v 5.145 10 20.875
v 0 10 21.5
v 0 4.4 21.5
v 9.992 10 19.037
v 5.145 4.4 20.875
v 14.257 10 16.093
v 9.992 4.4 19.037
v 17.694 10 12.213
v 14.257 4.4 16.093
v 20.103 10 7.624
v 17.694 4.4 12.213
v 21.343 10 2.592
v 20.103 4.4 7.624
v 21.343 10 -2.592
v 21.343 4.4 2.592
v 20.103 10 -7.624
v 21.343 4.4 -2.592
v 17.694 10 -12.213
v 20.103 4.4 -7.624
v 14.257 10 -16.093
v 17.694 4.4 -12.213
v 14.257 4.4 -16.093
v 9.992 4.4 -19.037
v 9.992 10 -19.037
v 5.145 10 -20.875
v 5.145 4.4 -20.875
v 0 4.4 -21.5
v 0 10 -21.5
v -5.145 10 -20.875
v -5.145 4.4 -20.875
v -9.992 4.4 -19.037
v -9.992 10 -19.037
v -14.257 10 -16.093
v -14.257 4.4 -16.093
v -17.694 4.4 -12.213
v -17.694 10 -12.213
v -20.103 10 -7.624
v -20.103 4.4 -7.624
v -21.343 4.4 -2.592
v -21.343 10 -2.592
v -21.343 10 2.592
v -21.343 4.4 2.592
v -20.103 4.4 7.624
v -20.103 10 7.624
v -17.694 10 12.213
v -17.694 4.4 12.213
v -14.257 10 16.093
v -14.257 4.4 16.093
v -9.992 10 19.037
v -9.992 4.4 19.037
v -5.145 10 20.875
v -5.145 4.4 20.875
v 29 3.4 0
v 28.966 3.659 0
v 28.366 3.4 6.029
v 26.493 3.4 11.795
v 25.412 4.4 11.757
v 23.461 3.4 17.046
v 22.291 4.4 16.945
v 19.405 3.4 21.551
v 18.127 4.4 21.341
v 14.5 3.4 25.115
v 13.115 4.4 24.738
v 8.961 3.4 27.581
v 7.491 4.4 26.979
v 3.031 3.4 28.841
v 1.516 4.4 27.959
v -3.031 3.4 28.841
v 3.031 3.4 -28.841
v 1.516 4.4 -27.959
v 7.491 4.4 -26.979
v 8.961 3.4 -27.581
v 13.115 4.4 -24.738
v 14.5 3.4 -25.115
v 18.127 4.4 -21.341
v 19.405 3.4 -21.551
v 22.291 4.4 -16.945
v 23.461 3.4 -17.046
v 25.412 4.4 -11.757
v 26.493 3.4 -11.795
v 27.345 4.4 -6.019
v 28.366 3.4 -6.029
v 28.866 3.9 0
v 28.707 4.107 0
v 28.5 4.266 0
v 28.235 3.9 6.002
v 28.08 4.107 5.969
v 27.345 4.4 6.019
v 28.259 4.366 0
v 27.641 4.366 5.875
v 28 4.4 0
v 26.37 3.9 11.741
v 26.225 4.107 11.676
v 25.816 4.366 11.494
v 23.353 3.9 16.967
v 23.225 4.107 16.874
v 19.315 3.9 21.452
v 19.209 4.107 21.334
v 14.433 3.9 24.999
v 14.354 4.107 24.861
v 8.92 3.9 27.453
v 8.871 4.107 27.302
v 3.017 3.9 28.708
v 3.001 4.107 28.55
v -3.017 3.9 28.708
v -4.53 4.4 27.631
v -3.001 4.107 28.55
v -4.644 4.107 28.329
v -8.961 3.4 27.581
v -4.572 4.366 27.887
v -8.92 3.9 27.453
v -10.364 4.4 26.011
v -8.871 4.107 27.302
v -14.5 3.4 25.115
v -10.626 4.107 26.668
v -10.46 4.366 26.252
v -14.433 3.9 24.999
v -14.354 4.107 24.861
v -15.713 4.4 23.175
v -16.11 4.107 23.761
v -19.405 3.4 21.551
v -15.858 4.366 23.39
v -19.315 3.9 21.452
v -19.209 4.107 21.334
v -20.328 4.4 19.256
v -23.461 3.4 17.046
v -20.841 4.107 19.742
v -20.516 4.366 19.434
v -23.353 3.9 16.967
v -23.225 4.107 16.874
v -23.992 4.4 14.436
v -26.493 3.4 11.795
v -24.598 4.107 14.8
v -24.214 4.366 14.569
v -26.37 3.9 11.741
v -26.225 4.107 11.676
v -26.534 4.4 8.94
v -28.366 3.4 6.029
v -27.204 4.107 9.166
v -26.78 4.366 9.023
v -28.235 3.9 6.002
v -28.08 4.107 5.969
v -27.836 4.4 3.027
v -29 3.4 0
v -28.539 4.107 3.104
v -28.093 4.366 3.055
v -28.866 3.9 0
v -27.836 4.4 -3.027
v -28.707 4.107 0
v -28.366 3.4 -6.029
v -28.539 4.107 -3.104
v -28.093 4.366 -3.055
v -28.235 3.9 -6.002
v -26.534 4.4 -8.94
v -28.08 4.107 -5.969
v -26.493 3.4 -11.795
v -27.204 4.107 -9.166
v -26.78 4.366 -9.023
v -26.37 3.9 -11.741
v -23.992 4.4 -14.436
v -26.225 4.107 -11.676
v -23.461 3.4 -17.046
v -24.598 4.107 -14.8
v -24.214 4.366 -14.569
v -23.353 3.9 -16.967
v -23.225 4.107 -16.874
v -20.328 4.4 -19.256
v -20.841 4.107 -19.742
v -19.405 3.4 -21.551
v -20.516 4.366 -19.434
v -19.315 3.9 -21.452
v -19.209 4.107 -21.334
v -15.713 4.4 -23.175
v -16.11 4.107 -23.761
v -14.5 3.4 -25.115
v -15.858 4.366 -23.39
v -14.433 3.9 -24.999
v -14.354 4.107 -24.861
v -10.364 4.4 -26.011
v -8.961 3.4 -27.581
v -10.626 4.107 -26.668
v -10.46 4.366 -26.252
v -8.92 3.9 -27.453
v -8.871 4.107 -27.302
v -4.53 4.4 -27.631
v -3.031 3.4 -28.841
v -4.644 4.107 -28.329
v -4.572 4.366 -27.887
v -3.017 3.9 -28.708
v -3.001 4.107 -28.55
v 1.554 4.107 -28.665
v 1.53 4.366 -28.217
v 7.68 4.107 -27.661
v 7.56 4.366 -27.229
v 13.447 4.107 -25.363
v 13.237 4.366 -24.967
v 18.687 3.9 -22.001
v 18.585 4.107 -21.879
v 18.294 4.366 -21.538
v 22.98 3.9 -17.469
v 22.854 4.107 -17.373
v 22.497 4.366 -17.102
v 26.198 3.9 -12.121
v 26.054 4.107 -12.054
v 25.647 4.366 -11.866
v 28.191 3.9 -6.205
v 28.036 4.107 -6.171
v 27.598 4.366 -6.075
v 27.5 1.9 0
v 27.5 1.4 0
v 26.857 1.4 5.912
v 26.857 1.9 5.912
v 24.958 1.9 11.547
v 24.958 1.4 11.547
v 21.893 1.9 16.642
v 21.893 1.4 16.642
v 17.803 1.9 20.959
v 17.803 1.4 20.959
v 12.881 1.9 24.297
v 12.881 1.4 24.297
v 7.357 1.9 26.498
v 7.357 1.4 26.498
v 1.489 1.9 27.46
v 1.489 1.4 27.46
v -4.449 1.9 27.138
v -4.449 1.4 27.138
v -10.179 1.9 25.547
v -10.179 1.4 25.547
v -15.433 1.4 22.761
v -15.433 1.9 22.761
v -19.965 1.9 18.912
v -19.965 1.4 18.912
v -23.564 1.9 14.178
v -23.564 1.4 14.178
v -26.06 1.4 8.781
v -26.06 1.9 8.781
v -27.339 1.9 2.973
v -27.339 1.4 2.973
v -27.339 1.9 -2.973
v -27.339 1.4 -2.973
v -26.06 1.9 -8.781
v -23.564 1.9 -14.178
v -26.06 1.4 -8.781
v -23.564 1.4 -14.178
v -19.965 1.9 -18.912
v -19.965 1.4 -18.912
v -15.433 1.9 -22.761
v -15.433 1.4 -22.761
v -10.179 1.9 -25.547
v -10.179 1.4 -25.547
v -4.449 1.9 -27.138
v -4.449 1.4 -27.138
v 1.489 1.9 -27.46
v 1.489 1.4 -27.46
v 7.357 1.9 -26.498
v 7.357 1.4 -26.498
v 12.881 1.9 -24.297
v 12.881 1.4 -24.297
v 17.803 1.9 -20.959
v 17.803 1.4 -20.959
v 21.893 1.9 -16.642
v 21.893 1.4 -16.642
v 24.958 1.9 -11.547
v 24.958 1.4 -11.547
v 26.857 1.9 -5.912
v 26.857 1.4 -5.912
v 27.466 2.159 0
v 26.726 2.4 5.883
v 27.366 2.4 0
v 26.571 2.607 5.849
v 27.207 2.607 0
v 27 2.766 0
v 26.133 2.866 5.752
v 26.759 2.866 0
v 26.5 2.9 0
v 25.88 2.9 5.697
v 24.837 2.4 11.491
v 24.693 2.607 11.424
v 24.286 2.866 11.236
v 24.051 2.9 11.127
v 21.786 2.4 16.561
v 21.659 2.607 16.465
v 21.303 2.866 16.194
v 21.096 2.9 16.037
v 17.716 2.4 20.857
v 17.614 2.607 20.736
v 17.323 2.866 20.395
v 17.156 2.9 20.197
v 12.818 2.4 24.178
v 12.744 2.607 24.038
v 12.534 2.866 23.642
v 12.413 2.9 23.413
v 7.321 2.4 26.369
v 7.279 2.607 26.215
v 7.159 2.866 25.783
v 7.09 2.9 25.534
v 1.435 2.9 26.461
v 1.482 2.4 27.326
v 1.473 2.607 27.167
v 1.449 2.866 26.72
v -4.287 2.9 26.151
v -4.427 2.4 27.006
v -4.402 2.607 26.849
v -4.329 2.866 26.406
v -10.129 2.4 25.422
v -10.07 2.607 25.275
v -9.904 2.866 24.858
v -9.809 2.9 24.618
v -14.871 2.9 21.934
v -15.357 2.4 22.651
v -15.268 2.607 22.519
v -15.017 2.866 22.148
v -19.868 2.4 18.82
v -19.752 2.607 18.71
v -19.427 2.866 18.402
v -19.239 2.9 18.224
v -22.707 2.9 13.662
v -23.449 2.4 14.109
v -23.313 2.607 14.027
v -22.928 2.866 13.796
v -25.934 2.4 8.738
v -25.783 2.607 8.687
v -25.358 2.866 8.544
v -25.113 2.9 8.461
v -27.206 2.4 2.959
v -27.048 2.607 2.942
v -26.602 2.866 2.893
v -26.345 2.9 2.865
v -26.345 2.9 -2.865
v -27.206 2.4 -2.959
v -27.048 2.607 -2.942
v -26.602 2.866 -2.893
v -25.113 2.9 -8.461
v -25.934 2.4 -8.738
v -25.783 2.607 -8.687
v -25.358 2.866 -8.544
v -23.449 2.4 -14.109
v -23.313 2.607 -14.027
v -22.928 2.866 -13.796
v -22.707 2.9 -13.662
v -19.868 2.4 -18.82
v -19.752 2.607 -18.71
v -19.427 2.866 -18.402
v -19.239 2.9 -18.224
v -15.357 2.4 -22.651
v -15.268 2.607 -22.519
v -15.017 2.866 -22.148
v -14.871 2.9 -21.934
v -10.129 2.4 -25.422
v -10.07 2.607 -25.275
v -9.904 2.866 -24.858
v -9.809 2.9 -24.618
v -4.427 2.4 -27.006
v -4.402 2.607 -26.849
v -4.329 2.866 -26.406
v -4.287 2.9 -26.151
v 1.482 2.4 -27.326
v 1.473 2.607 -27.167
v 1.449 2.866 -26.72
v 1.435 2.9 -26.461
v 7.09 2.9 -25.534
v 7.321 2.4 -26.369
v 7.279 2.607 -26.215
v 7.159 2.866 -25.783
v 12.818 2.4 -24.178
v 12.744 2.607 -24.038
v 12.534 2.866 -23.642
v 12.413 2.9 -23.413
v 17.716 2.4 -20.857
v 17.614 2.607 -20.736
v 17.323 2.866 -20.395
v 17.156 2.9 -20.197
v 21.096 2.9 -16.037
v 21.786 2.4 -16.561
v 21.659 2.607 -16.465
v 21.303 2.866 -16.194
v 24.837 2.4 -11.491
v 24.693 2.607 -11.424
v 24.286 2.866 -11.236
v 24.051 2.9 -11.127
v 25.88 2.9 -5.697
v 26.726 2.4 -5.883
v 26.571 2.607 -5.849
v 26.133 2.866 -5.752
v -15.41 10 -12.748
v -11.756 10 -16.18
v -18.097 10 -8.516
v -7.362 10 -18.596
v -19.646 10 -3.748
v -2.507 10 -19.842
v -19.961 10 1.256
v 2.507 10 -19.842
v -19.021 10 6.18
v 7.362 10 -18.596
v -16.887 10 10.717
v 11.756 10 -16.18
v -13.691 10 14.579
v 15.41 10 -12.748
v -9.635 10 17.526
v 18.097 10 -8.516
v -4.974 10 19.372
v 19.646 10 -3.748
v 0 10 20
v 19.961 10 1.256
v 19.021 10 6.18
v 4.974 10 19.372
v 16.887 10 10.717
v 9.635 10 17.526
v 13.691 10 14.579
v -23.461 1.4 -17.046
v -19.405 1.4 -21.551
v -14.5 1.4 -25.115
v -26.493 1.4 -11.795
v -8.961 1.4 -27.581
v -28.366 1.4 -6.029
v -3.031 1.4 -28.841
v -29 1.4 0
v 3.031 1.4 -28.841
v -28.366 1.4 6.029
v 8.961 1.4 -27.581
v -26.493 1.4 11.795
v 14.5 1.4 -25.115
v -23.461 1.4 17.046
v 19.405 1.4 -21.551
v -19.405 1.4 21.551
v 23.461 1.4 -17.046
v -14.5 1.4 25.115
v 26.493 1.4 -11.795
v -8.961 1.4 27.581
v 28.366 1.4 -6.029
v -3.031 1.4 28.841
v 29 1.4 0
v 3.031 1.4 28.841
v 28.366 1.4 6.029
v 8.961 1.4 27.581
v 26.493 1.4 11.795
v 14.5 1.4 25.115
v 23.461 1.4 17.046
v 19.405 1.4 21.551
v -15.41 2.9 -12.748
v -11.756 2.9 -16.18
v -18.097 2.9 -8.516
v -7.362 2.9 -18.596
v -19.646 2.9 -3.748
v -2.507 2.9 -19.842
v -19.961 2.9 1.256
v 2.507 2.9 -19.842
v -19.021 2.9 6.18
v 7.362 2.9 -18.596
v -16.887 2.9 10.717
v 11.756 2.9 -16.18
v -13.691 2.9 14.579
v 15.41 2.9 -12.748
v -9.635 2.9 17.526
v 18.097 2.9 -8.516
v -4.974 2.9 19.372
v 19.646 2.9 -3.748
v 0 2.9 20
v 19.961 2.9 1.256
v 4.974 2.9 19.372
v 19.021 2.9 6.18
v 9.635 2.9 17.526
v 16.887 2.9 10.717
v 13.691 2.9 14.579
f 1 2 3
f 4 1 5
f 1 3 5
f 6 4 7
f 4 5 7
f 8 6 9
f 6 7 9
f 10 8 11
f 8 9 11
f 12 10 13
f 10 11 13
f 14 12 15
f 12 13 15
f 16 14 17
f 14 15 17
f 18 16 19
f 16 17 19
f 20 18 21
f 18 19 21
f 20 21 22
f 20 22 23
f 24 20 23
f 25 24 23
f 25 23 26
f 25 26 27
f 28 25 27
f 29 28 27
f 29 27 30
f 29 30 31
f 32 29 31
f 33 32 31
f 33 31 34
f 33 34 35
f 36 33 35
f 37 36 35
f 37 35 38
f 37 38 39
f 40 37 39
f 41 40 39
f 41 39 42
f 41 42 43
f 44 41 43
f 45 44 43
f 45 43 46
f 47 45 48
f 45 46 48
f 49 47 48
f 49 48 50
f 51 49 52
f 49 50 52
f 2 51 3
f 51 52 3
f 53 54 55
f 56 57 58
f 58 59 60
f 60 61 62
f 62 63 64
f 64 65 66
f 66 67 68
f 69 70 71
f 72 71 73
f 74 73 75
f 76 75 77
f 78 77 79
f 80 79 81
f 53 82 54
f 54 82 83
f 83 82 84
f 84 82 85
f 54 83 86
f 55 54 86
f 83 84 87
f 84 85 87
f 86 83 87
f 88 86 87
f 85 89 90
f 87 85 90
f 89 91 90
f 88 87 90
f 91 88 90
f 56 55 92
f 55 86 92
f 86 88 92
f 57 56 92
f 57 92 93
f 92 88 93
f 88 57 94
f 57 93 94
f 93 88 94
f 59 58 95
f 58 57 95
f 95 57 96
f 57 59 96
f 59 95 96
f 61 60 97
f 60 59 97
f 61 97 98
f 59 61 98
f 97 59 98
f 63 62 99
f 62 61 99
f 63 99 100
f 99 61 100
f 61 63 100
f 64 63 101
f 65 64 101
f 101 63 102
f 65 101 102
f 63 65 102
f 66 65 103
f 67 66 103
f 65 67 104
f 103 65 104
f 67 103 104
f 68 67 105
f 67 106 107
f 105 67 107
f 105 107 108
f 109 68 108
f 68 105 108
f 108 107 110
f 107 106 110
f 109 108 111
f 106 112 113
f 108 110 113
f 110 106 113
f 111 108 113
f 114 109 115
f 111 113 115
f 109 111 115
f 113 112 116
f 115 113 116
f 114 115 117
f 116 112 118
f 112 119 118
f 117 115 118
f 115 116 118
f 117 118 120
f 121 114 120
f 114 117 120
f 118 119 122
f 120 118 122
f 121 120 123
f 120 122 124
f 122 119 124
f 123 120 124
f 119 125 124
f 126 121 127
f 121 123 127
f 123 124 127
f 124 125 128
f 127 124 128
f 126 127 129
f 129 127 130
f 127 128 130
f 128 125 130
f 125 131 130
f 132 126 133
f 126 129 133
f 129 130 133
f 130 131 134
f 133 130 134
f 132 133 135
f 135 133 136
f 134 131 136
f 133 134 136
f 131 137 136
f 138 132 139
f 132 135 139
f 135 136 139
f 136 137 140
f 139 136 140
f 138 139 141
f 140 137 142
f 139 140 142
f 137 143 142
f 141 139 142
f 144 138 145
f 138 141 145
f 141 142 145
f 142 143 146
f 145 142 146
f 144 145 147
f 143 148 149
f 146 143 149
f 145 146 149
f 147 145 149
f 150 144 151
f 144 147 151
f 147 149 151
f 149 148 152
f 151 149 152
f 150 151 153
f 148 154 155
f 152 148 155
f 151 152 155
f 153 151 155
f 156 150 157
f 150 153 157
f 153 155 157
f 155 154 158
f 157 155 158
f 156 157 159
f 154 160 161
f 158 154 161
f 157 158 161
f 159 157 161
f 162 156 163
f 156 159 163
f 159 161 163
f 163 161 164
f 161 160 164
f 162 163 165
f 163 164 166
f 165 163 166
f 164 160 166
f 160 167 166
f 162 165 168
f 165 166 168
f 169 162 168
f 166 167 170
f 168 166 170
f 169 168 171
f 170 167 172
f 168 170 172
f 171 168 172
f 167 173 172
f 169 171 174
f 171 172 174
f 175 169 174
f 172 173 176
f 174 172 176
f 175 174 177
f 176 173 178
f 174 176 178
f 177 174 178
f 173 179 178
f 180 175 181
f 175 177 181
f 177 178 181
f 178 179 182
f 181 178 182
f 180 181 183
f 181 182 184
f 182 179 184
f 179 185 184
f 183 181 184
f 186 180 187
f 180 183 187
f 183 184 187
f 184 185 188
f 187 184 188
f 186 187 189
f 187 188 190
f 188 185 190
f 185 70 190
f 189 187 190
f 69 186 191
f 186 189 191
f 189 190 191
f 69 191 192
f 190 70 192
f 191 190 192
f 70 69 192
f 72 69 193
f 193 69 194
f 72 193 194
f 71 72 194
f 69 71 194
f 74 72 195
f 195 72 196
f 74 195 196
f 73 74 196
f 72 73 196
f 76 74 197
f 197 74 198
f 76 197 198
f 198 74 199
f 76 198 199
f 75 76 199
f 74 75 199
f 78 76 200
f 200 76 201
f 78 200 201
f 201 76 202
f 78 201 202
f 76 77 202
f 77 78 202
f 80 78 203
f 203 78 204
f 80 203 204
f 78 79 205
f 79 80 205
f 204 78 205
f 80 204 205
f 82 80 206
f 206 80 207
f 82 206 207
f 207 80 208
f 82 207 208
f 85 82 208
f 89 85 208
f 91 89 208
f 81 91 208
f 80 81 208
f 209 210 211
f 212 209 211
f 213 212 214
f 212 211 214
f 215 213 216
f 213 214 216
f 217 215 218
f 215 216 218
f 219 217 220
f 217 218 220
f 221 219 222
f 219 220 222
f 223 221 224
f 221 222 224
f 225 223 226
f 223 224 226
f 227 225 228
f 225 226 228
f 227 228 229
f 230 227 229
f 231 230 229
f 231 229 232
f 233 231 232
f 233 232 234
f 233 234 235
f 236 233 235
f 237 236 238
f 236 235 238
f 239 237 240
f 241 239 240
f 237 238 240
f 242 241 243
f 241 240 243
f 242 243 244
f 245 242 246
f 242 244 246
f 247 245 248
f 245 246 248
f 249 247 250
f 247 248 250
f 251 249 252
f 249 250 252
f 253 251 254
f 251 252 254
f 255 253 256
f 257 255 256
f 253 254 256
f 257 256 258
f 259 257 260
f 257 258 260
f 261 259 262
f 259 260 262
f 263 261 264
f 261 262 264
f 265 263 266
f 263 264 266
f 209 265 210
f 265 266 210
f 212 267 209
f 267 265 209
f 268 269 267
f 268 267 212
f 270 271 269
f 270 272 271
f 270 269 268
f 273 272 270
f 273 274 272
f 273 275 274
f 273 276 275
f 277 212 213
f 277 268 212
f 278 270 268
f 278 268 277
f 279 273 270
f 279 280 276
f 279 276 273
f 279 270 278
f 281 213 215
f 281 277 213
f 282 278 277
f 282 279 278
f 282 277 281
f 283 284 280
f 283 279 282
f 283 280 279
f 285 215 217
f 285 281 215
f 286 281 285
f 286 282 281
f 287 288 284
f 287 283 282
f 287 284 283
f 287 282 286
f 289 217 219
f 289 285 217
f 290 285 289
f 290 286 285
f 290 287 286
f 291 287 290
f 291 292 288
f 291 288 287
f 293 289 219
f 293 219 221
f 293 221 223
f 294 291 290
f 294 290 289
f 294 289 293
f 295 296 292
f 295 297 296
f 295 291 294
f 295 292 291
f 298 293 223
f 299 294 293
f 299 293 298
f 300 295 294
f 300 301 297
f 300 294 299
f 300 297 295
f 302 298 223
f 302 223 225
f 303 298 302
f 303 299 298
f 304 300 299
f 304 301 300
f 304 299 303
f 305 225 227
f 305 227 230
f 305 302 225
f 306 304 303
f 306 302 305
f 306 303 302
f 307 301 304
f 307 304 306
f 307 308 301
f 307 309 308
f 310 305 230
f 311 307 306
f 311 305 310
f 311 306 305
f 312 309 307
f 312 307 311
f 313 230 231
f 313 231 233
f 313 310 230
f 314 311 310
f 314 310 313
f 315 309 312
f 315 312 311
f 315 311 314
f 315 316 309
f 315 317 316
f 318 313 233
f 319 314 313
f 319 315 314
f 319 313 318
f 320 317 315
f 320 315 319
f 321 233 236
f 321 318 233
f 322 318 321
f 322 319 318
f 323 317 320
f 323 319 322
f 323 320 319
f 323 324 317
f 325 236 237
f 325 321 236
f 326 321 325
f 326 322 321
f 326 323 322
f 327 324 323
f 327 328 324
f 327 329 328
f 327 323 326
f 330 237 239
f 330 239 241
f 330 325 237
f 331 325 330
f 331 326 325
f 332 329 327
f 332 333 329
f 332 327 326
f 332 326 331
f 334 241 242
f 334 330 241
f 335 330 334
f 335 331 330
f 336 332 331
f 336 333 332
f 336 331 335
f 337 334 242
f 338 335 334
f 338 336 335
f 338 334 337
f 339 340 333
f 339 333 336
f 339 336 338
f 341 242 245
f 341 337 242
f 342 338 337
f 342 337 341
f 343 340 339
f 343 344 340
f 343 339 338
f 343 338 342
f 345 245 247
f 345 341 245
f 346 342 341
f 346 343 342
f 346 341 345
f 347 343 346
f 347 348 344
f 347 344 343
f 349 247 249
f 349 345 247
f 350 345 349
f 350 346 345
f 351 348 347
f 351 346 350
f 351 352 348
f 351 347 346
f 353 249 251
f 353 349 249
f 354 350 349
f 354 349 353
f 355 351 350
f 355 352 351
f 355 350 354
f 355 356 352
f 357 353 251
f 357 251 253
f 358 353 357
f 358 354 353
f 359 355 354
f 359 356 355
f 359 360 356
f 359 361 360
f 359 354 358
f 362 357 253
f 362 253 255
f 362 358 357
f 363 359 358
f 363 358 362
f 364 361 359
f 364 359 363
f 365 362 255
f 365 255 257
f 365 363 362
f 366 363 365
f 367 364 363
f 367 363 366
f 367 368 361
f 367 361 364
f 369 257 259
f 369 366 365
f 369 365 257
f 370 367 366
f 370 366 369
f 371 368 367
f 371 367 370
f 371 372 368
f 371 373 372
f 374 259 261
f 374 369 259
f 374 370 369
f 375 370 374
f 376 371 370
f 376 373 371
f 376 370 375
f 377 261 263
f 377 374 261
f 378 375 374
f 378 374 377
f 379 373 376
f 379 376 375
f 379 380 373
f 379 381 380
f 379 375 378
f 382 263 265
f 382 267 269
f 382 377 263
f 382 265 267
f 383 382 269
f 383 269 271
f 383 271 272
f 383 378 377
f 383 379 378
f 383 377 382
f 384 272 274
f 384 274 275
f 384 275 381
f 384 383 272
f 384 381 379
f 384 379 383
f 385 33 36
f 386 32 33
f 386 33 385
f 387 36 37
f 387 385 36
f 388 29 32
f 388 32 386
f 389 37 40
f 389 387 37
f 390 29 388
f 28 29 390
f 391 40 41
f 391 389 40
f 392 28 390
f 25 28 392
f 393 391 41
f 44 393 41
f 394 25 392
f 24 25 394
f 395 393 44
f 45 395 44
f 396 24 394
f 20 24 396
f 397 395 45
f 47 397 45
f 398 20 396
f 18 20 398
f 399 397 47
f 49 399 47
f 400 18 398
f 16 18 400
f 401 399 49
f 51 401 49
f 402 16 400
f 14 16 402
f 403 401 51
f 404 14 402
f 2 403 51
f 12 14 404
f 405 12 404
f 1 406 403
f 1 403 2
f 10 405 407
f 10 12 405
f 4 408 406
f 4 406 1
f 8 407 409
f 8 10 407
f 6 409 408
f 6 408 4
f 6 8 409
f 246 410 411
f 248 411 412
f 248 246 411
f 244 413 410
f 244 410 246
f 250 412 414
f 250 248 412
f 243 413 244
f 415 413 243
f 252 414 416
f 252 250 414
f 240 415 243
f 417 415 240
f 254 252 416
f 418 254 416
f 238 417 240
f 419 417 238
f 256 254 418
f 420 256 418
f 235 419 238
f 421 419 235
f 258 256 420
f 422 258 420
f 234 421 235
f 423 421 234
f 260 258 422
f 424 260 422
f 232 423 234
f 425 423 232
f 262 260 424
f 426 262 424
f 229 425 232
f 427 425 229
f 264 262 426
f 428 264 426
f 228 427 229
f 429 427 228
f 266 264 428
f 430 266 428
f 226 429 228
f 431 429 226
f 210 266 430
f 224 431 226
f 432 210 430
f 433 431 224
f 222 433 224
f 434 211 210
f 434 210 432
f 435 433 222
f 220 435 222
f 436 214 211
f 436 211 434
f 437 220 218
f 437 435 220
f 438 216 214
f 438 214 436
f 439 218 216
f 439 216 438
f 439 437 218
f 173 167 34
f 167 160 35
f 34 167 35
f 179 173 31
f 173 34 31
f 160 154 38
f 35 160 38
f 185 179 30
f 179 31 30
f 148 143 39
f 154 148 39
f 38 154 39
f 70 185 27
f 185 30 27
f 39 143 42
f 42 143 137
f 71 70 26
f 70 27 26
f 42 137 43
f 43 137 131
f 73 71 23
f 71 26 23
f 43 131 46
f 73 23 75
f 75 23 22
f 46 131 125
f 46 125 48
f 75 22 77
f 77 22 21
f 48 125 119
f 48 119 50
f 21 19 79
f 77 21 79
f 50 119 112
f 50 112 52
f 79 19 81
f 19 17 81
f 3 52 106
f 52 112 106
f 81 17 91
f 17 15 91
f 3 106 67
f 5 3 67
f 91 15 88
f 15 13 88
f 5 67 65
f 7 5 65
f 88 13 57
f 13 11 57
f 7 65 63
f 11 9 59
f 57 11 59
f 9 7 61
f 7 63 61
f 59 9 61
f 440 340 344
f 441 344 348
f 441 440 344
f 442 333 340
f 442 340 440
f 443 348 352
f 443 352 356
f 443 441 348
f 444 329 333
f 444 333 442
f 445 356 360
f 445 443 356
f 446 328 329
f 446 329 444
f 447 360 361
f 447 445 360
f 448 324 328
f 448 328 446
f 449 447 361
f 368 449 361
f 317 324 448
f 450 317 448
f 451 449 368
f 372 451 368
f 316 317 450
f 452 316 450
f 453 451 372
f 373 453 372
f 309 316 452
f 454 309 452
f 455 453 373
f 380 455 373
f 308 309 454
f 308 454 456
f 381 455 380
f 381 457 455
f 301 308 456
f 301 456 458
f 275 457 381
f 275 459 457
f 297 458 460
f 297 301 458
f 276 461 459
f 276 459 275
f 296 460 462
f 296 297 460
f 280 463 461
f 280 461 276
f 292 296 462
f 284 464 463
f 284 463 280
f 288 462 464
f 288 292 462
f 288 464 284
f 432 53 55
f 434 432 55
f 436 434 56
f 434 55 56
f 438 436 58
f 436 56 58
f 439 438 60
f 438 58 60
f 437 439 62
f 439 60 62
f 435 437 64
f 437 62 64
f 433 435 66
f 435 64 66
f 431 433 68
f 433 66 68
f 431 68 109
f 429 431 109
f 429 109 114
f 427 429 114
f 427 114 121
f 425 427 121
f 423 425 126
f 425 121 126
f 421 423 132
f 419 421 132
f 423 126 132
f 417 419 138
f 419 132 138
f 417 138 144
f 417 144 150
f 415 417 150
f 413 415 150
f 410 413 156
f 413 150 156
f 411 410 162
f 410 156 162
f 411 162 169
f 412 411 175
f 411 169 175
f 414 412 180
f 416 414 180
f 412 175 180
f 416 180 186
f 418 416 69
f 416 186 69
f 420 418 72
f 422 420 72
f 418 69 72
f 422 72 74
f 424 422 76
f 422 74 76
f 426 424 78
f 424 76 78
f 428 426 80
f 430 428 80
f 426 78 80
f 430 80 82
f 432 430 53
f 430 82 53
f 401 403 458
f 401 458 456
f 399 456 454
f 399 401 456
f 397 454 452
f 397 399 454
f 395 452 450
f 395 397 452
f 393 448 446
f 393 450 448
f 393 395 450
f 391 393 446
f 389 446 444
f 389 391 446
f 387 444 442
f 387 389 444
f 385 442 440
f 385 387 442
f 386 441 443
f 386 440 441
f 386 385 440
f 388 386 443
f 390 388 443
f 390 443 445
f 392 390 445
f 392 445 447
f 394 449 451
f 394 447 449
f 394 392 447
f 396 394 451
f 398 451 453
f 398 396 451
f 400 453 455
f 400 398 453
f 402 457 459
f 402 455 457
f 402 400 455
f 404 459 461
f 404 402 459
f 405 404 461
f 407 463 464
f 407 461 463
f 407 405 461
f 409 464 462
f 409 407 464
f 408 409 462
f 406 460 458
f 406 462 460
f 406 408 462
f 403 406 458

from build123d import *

# Parameters (mm, degrees)
SKETCH1_R                = 21.5
SKETCH1_R_2              = 20
BOSS_EXTRUDE1_DEPTH      = 10
CUT_EXTRUDE1_DEPTH       = 24
CUT_EXTRUDE1_DEPTH_BACK  = 27
SKETCH3_W                = 51.96152563
SKETCH3_H                = 7.978608452
BOSS_EXTRUDE2_DEPTH      = 1.5
BOSS_EXTRUDE2_DEPTH_BACK = 1.5
SKETCH4_R                = 29
SKETCH4_R_2              = 20
SKETCH6_R                = 27.5
CUT_EXTRUDE2_DEPTH       = 1.5
FILLET1_R                = 1


with BuildPart() as part:
    # Sketch1 → Boss-Extrude1 (new body)
    with BuildSketch(Plane(origin=(0, 0, 0), x_dir=(1, 0, 0), z_dir=(0, 1, 0))):
        Circle(SKETCH1_R)
        Circle(SKETCH1_R_2, mode=Mode.SUBTRACT)
    extrude(amount=BOSS_EXTRUDE1_DEPTH)

    # Sketch3 → Cut-Extrude1 (cut, two sides: drawn at the far end of the back side and taken through both)
    with BuildSketch(Plane.XY.offset(-CUT_EXTRUDE1_DEPTH_BACK)):
        with Locations((-1.240371902, -1.089304226)):
            Rectangle(SKETCH3_W, SKETCH3_H)
    extrude(amount=CUT_EXTRUDE1_DEPTH + CUT_EXTRUDE1_DEPTH_BACK, mode=Mode.SUBTRACT)

    # Sketch4 → Boss-Extrude2 (add, two sides: drawn at the far end of the back side and taken through both)
    with BuildSketch(Plane.XZ.offset(-2.9).offset(-BOSS_EXTRUDE2_DEPTH_BACK)):
        Circle(SKETCH4_R)
        Circle(SKETCH4_R_2, mode=Mode.SUBTRACT)
    extrude(amount=BOSS_EXTRUDE2_DEPTH + BOSS_EXTRUDE2_DEPTH_BACK)

    # Sketch6 → Cut-Extrude2 (cut)
    with BuildSketch(Plane.XZ.offset(-1.4)):
        Circle(SKETCH6_R)
    extrude(amount=-CUT_EXTRUDE2_DEPTH, mode=Mode.SUBTRACT)

    # Fillet1
    fillet1_edges = [part.edges().sort_by_distance(p)[0] for p in [
        (-29, 4.4, 0),
        (-27.5, 2.9, 0),
    ]]
    fillet(fillet1_edges, radius=FILLET1_R)


solid = part.part
